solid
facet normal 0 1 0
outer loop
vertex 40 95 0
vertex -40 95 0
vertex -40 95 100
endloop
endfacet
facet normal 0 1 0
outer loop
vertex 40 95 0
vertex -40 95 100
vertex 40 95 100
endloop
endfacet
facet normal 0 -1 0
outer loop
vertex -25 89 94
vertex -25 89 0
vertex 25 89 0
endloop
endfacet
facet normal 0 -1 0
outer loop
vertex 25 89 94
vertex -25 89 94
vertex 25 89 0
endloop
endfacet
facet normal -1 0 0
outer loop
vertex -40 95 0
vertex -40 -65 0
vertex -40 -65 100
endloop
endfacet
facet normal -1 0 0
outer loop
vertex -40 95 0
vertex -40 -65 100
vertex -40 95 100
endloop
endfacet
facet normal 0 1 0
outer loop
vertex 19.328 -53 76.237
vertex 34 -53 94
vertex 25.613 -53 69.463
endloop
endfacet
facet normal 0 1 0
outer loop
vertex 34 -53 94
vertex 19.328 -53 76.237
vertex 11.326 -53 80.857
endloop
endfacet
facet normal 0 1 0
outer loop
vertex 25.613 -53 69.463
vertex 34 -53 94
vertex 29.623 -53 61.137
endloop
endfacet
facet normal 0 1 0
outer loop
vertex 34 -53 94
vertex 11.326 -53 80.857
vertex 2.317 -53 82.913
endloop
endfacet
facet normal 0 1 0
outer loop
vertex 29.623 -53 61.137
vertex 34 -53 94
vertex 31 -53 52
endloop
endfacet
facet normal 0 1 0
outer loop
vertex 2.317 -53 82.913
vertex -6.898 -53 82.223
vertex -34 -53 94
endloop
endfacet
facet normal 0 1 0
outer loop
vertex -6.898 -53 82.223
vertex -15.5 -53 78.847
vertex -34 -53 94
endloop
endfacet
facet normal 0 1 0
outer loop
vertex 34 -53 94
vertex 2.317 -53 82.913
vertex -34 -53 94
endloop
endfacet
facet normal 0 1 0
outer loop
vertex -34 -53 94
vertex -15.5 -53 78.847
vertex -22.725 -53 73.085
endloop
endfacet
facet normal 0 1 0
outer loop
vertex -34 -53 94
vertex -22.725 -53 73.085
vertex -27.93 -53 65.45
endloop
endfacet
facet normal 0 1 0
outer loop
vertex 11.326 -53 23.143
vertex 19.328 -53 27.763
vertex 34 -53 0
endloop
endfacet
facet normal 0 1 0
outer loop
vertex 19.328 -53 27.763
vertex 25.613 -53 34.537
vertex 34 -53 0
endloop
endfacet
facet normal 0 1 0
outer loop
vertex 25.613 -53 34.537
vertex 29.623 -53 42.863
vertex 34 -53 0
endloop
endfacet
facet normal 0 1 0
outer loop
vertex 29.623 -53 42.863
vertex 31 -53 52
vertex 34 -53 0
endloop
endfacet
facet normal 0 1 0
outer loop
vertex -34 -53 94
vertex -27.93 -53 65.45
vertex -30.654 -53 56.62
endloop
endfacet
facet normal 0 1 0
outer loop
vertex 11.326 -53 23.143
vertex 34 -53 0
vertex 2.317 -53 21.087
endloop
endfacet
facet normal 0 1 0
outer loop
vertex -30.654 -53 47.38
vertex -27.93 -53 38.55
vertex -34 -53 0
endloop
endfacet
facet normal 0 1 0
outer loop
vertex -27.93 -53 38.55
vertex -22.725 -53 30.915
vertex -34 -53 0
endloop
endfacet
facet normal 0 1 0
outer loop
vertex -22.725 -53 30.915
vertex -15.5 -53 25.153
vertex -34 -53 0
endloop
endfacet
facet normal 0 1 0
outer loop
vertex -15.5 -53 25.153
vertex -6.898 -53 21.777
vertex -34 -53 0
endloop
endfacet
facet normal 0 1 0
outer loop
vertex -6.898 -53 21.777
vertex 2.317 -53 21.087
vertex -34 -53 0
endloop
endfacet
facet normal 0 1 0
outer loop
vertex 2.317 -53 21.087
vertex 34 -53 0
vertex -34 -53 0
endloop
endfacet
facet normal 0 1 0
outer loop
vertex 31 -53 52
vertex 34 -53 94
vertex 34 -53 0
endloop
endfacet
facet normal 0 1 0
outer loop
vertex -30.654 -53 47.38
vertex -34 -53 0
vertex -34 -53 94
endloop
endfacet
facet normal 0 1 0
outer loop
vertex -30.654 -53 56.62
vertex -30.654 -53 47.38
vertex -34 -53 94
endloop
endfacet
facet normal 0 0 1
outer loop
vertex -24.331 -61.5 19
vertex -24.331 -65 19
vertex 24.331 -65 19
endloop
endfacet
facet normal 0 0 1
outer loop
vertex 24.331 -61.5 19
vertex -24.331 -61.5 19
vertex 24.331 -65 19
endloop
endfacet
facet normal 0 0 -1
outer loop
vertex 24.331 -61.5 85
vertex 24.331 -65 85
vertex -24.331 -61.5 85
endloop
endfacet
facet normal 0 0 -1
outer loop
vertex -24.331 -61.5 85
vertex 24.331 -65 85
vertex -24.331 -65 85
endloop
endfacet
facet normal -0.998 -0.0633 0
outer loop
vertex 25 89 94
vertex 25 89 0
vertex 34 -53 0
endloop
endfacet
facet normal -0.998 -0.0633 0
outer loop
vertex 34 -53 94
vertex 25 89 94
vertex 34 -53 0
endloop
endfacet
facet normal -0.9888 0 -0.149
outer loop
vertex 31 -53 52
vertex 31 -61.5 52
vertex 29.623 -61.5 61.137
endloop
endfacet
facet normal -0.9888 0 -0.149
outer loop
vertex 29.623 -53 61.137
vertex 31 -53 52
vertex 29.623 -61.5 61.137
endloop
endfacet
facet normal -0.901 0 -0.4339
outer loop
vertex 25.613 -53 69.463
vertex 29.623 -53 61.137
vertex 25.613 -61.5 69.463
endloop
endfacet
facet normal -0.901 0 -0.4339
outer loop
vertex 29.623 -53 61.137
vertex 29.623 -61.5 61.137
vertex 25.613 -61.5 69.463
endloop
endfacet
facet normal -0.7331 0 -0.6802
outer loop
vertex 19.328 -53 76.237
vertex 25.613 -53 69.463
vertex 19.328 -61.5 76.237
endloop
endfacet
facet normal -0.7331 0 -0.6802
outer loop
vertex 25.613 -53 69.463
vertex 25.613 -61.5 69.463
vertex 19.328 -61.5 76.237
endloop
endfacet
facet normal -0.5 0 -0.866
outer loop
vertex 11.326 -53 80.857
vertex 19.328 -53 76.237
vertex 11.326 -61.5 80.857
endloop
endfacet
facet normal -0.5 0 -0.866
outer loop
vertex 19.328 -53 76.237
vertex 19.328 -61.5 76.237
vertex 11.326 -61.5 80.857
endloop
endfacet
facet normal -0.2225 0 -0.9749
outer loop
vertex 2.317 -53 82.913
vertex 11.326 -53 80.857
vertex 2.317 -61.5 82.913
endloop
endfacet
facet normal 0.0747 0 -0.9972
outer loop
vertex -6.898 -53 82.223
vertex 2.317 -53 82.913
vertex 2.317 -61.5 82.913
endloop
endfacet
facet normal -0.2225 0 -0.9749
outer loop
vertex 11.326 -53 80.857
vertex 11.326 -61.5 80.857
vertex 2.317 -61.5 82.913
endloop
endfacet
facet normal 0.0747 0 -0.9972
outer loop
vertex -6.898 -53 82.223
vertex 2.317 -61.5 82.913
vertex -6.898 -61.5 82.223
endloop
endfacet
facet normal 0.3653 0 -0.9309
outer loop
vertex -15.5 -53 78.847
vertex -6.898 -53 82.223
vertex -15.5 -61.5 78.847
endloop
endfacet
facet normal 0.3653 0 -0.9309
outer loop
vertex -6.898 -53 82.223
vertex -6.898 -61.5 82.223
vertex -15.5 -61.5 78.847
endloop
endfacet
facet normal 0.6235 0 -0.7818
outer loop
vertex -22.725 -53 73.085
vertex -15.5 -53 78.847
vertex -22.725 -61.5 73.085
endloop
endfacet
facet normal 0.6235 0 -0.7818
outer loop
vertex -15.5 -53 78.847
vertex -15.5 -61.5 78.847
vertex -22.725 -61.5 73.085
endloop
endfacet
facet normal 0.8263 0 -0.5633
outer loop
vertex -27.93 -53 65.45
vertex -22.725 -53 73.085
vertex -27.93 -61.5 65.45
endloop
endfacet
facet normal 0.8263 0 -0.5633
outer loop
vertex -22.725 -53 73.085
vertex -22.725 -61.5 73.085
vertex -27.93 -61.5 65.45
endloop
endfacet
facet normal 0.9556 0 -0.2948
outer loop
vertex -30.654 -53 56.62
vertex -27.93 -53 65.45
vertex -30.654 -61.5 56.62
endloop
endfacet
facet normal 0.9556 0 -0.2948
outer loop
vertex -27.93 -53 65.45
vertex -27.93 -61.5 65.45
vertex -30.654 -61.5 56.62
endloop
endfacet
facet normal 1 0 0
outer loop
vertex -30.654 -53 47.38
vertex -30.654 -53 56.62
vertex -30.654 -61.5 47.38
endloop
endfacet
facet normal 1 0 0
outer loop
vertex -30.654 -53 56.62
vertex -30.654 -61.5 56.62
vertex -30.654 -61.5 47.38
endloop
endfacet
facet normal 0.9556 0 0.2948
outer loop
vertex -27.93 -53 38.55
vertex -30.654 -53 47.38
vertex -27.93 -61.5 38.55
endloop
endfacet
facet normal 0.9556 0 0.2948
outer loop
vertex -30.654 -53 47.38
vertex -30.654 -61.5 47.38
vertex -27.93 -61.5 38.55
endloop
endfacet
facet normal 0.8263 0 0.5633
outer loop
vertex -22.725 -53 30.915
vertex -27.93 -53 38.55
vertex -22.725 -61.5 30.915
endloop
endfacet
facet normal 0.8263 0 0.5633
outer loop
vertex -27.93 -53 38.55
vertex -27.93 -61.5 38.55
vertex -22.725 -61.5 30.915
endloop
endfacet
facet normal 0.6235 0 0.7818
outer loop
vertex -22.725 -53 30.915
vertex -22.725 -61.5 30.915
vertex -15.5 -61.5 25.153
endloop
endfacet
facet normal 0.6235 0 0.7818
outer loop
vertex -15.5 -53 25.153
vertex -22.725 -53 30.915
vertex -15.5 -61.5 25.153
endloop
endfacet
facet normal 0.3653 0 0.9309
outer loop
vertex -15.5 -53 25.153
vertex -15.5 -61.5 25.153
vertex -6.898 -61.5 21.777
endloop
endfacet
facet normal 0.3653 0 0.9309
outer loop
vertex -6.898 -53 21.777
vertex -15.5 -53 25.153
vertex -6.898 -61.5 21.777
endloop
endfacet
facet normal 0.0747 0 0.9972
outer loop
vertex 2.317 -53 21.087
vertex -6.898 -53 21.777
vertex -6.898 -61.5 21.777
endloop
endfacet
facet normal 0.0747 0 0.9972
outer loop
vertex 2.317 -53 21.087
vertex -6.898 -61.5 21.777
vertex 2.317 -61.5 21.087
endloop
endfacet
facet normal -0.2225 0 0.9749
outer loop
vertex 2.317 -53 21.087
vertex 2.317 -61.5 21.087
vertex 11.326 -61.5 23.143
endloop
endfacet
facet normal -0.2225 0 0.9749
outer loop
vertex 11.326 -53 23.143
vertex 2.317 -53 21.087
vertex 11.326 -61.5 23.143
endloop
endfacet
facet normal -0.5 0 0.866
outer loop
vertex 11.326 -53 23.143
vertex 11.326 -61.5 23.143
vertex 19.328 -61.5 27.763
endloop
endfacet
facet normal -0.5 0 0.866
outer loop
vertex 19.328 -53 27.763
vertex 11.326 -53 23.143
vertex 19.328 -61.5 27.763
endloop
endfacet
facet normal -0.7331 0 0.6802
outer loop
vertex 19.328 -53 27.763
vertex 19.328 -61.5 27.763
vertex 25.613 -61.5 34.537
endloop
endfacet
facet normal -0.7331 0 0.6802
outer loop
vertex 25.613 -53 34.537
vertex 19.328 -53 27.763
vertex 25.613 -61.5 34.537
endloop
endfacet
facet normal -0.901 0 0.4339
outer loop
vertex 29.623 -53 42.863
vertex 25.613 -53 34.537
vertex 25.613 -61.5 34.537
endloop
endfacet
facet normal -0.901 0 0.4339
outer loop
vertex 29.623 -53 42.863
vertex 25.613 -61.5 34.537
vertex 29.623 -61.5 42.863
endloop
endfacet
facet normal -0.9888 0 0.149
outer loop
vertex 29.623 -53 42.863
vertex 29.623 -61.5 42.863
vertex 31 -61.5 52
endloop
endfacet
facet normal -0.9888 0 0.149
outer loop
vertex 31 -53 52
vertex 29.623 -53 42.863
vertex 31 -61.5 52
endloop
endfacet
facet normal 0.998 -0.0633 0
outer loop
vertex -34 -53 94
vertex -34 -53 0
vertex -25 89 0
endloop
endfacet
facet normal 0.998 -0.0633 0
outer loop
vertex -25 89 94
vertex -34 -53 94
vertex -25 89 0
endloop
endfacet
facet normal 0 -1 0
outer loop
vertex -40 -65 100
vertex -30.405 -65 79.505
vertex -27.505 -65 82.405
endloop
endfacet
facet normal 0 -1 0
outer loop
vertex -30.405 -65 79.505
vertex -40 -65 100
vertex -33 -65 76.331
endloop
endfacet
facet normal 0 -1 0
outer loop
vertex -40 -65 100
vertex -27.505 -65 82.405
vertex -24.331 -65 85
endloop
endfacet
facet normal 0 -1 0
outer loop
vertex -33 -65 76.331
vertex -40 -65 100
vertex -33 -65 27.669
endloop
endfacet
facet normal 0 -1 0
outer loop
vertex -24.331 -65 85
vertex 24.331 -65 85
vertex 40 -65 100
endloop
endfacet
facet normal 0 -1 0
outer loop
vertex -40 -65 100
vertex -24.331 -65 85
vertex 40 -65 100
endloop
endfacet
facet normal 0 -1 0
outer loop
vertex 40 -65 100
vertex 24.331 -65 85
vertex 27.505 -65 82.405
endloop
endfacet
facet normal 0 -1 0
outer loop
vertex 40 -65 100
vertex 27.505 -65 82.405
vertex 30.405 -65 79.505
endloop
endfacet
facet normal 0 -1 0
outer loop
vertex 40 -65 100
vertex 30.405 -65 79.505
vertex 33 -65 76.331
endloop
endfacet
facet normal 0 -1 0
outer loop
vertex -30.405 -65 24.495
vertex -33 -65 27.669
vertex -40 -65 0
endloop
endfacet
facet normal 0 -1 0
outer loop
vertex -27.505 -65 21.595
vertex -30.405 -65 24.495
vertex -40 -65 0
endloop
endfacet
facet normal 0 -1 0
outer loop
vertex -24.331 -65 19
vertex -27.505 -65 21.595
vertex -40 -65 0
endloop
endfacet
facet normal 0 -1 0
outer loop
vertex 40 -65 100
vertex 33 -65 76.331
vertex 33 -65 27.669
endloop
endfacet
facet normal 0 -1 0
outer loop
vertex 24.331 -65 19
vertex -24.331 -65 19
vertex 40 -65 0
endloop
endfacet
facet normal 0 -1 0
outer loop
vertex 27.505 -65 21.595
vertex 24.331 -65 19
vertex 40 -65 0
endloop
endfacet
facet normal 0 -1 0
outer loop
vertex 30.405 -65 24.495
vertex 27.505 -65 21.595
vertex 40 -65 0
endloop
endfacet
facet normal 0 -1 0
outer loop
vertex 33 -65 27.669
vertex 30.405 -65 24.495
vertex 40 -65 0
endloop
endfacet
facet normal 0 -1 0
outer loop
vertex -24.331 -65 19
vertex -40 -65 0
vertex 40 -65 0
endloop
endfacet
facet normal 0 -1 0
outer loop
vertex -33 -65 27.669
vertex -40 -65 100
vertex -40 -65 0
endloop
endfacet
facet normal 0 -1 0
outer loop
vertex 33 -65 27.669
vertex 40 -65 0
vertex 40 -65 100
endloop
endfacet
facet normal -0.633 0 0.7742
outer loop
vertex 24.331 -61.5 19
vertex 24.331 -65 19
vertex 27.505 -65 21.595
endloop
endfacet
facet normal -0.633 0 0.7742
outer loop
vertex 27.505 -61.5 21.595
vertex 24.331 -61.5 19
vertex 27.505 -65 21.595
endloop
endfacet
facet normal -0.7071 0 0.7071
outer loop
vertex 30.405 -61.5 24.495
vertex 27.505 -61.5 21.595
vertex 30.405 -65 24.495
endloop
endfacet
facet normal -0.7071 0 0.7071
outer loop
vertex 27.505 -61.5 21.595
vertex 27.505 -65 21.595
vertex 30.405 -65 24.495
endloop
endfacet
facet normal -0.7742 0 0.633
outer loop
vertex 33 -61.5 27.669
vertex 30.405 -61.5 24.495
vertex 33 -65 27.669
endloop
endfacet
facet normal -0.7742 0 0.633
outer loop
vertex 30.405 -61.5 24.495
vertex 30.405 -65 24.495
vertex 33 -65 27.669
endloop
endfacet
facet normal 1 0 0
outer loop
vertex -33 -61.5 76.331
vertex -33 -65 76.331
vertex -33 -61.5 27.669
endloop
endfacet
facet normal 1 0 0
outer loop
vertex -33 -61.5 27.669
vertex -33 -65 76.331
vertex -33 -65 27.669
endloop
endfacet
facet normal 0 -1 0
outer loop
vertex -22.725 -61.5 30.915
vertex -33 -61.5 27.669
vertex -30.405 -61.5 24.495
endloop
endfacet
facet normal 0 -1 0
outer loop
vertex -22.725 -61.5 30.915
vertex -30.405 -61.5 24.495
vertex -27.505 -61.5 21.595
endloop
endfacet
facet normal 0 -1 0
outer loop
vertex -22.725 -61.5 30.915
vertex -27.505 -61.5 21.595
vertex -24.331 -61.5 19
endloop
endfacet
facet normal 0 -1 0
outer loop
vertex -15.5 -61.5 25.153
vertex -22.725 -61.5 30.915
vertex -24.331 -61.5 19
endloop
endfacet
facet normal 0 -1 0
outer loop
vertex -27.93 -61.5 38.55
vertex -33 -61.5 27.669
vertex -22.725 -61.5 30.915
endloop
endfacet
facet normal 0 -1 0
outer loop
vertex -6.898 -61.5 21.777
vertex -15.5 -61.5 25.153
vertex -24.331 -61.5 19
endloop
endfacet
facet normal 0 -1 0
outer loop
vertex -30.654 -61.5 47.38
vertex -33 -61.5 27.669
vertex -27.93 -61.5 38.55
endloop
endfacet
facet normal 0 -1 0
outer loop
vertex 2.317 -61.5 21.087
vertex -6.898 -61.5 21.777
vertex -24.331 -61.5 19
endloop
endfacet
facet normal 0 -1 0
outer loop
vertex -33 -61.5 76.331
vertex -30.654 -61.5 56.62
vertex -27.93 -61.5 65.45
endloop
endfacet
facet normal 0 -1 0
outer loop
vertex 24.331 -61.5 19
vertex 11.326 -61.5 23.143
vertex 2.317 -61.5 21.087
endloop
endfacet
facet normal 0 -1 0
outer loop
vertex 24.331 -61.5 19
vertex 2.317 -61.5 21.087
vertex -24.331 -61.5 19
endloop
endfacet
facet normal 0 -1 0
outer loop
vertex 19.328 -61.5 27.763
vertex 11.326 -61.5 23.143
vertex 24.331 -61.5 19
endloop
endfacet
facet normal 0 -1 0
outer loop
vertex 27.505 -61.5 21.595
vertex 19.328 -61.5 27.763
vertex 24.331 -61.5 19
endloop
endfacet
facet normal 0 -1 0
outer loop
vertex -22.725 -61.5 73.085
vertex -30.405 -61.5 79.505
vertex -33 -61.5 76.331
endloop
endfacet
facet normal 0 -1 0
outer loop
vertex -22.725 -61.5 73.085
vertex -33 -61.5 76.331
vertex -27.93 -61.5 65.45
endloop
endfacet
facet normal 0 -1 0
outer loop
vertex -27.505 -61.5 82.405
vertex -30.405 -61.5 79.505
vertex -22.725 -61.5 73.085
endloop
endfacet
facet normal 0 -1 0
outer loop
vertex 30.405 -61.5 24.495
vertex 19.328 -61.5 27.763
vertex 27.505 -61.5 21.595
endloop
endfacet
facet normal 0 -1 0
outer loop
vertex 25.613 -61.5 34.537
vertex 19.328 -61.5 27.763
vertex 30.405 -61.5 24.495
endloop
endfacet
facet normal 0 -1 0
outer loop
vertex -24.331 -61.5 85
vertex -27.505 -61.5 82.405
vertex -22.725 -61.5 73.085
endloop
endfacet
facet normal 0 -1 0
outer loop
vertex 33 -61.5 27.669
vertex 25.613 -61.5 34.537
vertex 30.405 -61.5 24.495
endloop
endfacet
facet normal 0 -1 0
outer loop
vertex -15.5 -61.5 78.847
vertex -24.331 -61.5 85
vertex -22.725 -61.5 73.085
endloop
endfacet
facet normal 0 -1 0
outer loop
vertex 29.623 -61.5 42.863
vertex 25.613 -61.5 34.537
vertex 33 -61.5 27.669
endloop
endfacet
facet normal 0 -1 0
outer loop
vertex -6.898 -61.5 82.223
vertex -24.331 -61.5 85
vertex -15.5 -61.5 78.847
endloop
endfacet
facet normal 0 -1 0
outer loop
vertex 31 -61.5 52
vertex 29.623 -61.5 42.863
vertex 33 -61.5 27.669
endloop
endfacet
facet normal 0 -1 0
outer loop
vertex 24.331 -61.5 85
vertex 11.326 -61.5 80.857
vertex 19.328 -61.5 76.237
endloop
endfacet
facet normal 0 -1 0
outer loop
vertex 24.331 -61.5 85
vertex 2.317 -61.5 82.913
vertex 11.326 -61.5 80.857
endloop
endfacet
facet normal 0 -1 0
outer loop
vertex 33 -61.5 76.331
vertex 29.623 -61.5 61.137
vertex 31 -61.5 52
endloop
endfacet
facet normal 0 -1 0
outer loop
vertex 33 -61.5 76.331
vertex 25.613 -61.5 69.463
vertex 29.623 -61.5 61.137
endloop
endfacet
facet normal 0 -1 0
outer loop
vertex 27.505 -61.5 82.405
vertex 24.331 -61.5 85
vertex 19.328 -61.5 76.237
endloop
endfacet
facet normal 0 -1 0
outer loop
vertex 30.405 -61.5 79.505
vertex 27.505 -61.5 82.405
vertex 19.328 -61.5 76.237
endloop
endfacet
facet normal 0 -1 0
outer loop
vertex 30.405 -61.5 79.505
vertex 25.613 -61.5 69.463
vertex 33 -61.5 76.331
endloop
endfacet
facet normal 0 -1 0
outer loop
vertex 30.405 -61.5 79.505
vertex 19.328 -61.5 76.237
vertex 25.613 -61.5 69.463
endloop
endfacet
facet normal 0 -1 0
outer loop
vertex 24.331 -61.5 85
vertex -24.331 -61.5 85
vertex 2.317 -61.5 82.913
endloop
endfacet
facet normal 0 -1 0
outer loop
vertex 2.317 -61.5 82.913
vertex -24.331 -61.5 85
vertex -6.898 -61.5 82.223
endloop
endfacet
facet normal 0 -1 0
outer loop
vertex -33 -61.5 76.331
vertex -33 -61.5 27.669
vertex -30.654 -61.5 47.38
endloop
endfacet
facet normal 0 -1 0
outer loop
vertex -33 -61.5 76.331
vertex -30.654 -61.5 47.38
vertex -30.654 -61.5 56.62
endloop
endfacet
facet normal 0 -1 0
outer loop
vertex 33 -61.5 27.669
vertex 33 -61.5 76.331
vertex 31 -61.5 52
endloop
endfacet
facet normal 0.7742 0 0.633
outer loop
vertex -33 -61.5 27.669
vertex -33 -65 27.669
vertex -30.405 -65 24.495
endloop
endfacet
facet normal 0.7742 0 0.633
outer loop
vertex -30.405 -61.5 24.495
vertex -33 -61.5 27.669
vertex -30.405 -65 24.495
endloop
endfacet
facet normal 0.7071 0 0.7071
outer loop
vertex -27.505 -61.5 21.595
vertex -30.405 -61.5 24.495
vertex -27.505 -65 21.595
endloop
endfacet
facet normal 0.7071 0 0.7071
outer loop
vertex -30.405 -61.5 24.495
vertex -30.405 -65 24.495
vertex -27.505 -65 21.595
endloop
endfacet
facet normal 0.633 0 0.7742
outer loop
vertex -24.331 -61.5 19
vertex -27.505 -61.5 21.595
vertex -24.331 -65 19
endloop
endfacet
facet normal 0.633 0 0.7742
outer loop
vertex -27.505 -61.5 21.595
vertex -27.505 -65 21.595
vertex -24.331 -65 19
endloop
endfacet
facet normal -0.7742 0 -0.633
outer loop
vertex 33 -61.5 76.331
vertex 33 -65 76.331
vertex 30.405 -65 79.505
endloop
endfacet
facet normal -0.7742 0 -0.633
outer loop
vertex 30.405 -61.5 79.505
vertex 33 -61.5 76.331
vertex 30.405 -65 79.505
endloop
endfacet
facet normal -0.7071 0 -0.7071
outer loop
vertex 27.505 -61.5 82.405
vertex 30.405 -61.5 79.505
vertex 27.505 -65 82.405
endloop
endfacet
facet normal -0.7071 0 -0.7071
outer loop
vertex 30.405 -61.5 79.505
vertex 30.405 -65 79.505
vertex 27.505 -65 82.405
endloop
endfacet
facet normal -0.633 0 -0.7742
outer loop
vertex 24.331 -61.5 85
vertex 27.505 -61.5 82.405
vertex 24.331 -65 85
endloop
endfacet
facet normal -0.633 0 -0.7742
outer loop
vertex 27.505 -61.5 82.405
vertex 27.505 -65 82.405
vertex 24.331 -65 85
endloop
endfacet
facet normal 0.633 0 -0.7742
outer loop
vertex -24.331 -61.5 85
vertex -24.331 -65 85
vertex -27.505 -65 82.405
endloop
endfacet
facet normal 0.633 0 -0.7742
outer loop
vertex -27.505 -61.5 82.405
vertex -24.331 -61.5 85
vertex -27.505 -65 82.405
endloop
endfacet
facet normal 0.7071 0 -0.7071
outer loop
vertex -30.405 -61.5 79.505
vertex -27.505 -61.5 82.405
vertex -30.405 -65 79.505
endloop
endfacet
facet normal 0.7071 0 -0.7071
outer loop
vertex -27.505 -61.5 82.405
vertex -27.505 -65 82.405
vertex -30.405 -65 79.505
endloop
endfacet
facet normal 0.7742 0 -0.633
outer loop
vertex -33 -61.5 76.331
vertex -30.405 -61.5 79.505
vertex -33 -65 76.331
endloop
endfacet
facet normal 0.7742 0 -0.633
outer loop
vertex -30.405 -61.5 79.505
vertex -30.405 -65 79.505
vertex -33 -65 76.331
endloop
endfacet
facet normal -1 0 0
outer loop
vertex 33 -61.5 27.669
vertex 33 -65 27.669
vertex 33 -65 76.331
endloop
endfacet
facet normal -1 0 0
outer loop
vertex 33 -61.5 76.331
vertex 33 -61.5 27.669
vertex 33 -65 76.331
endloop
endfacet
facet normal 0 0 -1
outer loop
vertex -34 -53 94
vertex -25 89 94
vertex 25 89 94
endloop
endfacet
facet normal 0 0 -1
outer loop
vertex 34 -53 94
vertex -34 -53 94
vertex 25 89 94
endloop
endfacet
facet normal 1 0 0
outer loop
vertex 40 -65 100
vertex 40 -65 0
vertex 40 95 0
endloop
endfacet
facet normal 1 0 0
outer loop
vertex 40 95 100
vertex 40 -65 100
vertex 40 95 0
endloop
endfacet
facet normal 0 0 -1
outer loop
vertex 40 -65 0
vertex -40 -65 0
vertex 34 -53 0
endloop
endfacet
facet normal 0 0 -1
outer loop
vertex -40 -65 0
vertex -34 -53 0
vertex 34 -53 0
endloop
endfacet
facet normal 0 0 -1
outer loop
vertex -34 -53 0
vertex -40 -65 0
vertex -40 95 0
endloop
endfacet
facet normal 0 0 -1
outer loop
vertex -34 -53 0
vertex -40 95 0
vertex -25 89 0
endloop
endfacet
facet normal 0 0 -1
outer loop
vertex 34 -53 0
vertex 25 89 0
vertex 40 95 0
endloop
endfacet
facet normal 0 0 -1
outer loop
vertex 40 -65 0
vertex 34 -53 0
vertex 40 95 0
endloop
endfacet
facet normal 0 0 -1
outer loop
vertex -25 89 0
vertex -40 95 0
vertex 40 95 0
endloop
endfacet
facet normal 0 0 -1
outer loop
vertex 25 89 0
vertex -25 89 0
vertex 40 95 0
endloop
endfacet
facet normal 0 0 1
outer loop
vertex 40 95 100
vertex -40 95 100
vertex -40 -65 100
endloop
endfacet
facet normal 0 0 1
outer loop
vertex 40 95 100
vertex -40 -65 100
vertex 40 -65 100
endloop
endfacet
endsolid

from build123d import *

# Parameters (mm, degrees)
F0_W     = 80
F0_H     = 160
F1_DEPTH = 100
F3_DEPTH = 94
F5_DEPTH = 3.5
F6_R     = 31
F7_DEPTH = 25
F8_ANGLE = 180


with BuildPart() as f1:
    # F0 (on Top) → F1 (new body)
    with BuildSketch(Plane.XY):
        with Locations((0, 15)):
            Rectangle(F0_W, F0_H)
    extrude(amount=F1_DEPTH)

    # F2 (on face) → F3 (cut)
    with BuildSketch(Plane(origin=(0, 0, 0), x_dir=(1, 0, 0), z_dir=(0, 0, -1))):
        Polygon((-25, -89), (25, -89), (34, 53), (-34, 53), align=None)
    extrude(amount=-F3_DEPTH, mode=Mode.SUBTRACT)

    # F4 (on face) → F5 (cut)
    with BuildSketch(Plane.XZ.offset(65)):
        with BuildLine():
            Line((24.33105, 85), (-24.33105, 85))
            ThreePointArc((-24.33105, 85), (-28.991378, 80.991378), (-33, 76.33105))
            Line((-33, 76.33105), (-33, 27.66895))
            ThreePointArc((-33, 27.66895), (-28.991378, 23.008622), (-24.33105, 19))
            Line((-24.33105, 19), (24.33105, 19))
            ThreePointArc((24.33105, 19), (28.991378, 23.008622), (33, 27.66895))
            Line((33, 27.66895), (33, 76.33105))
            ThreePointArc((33, 76.33105), (28.991378, 80.991378), (24.33105, 85))
        make_face()
    extrude(amount=-F5_DEPTH, mode=Mode.SUBTRACT)

    # F6 (on face) → F7 (cut)
    with BuildSketch(Plane.XZ.offset(61.5)):
        with Locations((0, 52)):
            Circle(F6_R)
    extrude(amount=-F7_DEPTH, mode=Mode.SUBTRACT)


with BuildPart() as f8_1:
    # F8: copy of F1
    add(f1.part.rotate(Axis((40, 15, 0), (0, -1, 0)), F8_ANGLE))


solid = f1.part
